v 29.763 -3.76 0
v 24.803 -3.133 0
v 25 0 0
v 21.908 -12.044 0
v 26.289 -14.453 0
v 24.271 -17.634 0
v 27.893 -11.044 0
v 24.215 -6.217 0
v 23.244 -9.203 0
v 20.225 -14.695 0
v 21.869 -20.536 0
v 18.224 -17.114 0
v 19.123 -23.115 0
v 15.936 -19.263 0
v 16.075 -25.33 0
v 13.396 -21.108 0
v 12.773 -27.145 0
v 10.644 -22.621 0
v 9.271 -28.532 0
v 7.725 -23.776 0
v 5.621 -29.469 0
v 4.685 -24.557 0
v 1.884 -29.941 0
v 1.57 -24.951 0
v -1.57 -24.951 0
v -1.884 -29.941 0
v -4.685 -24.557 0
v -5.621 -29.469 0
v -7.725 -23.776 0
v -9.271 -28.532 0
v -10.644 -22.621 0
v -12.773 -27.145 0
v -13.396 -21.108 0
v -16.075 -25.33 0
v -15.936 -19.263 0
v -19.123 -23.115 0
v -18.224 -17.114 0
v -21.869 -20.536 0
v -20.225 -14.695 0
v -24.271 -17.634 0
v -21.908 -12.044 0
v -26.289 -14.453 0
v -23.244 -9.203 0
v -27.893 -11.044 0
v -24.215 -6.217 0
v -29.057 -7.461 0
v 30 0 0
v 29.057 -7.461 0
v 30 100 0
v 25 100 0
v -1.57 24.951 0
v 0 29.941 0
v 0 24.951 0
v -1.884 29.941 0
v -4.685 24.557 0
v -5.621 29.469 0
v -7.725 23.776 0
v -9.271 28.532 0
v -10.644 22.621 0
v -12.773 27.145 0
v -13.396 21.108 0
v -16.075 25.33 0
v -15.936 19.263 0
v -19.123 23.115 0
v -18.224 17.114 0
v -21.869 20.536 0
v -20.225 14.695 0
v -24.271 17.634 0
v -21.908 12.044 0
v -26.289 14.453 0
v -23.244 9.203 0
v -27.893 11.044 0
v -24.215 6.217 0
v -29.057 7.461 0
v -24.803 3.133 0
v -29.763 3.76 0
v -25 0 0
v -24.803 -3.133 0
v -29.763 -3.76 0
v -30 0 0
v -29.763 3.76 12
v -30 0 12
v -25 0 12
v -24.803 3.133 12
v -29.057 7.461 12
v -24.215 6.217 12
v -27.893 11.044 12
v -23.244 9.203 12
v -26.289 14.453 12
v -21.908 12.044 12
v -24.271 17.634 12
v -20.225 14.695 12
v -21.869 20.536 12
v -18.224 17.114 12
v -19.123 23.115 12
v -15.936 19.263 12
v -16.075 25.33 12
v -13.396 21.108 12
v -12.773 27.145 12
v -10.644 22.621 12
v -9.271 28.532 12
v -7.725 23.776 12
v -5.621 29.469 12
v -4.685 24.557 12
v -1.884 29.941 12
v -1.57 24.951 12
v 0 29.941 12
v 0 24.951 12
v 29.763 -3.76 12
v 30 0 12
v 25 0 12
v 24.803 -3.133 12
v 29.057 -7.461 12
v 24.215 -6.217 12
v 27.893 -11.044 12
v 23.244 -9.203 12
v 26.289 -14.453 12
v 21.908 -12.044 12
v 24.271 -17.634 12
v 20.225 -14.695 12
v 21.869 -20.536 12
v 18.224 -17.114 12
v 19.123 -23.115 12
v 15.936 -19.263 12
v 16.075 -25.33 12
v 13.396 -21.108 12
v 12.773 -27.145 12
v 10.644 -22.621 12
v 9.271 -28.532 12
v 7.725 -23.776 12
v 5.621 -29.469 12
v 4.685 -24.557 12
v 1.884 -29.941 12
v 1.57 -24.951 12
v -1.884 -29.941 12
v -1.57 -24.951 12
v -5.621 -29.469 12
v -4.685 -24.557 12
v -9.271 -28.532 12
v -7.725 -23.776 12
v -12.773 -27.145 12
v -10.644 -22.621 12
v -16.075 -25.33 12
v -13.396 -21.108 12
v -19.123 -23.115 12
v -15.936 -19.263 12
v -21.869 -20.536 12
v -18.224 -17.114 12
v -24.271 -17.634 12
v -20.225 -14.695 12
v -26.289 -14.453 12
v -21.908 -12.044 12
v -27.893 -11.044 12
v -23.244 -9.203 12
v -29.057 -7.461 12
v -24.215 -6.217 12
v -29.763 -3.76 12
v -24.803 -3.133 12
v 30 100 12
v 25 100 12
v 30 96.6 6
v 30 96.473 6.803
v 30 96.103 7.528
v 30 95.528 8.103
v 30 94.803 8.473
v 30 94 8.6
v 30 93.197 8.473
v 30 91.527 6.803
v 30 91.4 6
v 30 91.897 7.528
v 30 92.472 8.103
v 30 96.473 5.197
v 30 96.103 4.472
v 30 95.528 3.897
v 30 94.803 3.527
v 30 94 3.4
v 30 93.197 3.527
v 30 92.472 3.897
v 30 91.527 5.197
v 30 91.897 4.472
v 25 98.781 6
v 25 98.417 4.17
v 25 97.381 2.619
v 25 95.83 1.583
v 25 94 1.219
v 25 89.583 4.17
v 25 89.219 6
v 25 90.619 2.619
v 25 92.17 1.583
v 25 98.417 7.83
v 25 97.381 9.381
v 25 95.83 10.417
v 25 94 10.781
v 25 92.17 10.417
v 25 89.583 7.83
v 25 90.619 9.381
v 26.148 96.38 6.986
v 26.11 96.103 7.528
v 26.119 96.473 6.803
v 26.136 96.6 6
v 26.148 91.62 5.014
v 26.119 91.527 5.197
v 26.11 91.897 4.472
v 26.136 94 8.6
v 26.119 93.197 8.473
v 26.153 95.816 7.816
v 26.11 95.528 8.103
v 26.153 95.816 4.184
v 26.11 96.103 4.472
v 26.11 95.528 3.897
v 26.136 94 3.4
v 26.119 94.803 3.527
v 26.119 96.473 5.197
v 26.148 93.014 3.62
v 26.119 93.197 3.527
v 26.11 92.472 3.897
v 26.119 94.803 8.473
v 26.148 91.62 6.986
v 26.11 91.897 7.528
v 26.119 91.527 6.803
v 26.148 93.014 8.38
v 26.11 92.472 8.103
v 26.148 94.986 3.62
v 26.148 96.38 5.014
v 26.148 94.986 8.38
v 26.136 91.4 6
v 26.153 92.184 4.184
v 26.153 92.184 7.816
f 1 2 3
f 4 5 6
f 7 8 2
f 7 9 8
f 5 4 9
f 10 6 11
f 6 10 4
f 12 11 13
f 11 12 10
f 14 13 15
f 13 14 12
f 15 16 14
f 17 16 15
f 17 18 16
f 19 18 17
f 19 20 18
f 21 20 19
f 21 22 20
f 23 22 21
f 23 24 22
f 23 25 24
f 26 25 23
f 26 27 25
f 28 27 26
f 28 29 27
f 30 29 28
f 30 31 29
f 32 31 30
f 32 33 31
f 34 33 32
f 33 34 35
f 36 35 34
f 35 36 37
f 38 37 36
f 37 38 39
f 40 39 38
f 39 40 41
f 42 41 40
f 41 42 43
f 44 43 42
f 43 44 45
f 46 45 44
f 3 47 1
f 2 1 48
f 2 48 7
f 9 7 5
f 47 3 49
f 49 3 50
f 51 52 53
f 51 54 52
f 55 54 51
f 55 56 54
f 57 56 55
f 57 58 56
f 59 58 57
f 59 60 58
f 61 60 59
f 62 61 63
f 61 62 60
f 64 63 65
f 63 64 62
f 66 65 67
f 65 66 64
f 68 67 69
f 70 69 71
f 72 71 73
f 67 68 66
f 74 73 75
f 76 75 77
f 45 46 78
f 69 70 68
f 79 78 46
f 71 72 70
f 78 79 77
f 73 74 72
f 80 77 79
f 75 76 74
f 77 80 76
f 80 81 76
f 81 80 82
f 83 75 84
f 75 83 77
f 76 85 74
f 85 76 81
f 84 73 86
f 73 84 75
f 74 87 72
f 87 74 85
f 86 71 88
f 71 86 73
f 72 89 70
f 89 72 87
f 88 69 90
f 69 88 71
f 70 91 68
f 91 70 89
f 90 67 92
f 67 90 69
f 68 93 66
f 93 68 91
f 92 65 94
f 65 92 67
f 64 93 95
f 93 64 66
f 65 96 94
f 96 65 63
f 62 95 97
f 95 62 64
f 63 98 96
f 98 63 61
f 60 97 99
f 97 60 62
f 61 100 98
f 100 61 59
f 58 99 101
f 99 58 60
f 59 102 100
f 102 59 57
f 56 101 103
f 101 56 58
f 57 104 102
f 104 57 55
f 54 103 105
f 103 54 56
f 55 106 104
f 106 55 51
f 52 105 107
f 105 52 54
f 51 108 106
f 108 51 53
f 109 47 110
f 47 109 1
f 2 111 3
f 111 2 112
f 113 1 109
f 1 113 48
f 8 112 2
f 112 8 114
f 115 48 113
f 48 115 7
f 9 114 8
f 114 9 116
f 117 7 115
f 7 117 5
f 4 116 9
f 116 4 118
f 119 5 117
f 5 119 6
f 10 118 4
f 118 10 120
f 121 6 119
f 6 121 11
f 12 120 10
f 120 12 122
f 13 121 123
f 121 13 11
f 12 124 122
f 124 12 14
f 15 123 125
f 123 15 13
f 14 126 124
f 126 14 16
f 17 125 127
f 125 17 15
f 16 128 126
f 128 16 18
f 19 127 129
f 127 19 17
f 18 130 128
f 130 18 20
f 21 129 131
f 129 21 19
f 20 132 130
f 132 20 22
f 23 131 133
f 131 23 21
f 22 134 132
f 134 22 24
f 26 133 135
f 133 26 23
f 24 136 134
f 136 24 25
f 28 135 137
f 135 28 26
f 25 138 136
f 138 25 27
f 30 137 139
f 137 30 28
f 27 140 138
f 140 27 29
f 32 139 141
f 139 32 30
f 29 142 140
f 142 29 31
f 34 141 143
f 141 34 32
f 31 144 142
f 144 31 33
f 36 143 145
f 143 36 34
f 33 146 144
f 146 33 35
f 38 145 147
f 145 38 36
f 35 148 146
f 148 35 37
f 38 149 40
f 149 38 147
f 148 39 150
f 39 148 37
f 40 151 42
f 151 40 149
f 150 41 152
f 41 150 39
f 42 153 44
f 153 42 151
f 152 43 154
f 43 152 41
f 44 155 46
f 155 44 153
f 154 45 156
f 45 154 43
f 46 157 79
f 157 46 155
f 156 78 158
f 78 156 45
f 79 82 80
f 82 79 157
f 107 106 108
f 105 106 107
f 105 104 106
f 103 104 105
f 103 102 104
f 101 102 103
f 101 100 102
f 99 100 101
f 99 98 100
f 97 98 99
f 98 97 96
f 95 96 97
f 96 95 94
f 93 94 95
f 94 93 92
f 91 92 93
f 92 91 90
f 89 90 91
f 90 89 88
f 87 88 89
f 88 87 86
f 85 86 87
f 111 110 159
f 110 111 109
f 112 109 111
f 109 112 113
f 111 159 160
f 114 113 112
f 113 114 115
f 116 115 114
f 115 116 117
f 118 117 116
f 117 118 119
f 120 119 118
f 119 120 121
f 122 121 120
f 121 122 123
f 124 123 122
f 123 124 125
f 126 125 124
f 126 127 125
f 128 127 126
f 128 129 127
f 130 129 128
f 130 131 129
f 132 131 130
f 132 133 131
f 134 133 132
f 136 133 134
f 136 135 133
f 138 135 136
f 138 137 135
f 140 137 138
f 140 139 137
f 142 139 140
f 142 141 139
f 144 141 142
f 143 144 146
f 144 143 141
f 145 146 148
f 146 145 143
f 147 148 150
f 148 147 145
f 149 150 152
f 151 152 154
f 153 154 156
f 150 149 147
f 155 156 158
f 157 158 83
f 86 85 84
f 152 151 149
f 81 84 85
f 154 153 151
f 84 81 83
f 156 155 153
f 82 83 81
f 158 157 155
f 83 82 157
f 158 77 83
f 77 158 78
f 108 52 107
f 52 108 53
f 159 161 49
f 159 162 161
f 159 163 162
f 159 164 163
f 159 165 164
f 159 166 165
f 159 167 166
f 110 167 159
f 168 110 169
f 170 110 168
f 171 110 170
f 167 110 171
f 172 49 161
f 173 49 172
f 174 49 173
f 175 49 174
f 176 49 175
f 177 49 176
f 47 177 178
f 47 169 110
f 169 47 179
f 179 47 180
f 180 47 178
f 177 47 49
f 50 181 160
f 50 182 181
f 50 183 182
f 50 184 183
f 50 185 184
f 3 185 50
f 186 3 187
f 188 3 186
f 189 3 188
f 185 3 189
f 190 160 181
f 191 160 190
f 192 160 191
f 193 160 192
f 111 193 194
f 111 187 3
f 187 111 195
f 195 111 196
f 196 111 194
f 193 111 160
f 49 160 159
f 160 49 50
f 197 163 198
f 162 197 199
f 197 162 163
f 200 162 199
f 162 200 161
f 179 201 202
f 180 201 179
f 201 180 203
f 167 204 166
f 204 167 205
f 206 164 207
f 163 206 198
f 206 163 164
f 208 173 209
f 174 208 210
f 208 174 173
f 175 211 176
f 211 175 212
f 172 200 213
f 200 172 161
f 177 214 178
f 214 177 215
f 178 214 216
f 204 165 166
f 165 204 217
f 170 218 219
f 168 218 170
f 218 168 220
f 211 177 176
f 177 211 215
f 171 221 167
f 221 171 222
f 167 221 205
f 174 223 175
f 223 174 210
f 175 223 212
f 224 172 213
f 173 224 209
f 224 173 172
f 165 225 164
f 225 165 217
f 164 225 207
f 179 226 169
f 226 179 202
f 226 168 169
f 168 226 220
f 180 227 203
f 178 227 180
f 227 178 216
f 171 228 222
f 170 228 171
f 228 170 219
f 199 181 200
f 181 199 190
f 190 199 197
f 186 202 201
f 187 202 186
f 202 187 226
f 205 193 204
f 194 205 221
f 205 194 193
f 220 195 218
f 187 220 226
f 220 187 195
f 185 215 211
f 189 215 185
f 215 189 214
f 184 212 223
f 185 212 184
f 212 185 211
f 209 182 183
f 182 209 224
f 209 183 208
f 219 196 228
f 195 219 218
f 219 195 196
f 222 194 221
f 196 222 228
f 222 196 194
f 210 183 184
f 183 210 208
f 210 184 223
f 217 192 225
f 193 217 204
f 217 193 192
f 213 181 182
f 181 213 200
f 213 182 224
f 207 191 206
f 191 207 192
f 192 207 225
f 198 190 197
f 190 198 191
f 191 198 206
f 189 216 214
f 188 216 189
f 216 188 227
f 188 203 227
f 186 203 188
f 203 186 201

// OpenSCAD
// Radius of hook [mm]
hookRadius=25; 
// Width of hook [mm]
width=12; 
//Thickness of hook [mm]
thickness=5; 
// Radius of mounting hole [mm]
holeRadius=2.6; 
// height of mounting section [mm]
height=100;  

union() {

  difference() {
    rotate_extrude(convexity = 10,$fn=50)
    translate([hookRadius, 0, 0])
    square([thickness,width]);
  
    translate([0,0,-1])
    cube([hookRadius*2,hookRadius*2,width+2]);
  }
  
  
  difference() {
    translate([hookRadius,0,0])
    cube([thickness,height,width]);
  
    translate([hookRadius-1,height-max(holeRadius*2, width/2),width/2])
    rotate([90,0,90])
    cylinder(r=holeRadius,h=thickness+2,$fn=20);
    translate([hookRadius-0.01,height-max(holeRadius*2, width/2),width/2])
    rotate([90,0,90])
    cylinder(r1=4.8,r2=0,h=min(thickness/2, 5));
  }
}
